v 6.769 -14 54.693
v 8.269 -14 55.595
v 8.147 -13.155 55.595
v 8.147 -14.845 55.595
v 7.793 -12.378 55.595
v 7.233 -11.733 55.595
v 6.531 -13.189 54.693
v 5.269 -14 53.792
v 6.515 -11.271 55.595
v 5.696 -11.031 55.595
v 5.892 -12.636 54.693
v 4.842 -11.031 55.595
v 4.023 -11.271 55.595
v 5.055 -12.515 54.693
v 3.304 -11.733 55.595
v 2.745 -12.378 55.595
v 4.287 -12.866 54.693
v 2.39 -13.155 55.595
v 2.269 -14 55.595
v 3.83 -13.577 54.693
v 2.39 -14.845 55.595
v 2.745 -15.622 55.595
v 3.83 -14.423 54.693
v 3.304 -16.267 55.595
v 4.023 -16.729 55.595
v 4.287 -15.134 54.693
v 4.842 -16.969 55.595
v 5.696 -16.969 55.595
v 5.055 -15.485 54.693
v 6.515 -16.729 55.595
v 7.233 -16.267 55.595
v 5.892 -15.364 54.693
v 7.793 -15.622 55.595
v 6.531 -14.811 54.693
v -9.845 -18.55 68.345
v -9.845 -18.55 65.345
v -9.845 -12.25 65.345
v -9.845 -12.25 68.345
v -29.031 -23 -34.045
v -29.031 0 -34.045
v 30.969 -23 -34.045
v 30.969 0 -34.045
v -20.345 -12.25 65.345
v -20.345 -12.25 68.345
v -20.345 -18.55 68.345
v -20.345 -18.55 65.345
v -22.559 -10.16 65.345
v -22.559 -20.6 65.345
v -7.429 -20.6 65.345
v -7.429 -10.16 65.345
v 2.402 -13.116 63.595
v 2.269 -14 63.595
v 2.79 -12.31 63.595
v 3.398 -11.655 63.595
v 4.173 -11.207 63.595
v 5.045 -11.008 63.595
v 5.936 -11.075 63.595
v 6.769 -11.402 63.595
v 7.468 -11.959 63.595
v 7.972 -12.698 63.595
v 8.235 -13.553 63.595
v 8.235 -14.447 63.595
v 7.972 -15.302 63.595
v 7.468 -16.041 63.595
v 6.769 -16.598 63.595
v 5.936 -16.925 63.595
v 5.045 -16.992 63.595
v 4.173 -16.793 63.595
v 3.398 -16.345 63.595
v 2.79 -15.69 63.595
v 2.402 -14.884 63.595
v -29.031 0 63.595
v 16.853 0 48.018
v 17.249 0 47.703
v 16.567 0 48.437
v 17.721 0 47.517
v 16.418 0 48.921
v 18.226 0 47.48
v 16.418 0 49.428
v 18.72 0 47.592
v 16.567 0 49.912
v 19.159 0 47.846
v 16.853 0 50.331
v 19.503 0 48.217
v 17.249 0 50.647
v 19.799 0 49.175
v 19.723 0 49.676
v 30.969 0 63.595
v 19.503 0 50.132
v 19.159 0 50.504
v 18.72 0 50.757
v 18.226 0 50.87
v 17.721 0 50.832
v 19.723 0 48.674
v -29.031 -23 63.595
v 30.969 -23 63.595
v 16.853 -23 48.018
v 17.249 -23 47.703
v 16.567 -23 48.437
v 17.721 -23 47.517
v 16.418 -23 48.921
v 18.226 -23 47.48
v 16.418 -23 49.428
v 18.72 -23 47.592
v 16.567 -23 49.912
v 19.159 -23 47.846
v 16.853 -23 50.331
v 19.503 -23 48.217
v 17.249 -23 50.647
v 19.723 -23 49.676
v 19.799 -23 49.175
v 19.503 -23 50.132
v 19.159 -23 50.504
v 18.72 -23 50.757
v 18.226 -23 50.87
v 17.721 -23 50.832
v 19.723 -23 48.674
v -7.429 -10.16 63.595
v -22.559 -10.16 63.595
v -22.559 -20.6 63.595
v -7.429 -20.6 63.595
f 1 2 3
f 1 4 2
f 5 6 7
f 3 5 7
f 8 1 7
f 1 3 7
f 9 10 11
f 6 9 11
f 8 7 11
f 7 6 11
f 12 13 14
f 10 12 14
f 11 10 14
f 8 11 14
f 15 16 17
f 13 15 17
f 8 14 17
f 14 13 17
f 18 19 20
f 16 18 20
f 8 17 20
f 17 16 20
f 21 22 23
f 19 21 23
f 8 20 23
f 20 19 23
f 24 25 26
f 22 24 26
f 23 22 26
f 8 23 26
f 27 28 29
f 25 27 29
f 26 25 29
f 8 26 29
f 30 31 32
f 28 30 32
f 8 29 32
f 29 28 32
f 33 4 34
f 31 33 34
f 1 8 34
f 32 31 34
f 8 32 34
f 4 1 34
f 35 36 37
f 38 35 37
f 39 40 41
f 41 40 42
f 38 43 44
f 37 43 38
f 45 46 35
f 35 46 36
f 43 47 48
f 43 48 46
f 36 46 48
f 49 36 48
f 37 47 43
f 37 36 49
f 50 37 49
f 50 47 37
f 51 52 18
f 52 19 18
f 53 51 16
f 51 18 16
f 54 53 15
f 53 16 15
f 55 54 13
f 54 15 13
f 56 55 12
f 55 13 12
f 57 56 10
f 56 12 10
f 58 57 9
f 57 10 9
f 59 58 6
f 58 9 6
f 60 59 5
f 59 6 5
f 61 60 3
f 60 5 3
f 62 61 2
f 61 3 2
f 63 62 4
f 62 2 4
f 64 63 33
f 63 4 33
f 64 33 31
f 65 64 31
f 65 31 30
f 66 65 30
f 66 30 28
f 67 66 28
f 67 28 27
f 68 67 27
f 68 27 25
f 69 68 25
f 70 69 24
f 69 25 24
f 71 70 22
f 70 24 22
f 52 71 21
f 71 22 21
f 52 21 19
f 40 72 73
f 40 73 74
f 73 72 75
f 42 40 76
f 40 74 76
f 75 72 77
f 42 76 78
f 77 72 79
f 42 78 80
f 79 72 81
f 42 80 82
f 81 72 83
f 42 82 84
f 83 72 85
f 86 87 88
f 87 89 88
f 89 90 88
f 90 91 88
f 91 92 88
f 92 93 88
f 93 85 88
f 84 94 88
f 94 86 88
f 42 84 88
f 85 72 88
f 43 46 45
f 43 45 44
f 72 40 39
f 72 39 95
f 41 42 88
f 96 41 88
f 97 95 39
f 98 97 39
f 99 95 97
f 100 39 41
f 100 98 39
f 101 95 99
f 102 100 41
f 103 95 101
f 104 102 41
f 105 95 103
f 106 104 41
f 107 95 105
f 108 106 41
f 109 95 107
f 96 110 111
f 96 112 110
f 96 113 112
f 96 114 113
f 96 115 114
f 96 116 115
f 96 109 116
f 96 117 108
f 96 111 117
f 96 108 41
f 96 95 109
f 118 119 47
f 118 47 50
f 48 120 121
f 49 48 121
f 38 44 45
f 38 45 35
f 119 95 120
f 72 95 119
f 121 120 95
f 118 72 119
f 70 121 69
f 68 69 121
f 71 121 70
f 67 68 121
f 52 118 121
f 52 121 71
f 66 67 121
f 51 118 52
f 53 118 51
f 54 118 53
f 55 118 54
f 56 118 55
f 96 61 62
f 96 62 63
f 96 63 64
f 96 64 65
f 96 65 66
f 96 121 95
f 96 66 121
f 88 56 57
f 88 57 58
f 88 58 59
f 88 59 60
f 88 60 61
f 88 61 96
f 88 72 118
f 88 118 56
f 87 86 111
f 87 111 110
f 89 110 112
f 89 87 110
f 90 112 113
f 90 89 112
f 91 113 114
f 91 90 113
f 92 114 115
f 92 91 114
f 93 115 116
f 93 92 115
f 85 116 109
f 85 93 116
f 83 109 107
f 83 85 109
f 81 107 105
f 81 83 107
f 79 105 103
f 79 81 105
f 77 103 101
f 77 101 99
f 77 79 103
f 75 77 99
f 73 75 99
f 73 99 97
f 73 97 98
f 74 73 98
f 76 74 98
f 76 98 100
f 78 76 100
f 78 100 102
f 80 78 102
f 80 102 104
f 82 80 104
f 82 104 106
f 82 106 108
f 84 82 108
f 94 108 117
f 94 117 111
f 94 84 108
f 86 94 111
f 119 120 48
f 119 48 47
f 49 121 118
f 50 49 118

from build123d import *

# Parameters (mm, degrees)
F0_W     = 60
F0_H     = 97.64
F0_R     = 1.7
F1_DEPTH = 23
F3_D     = 6
F3_DEPTH = 8
F3_TIP   = 1.8025818571
F2_W     = 10.5
F2_H     = 6.3
F4_DEPTH = 4.75
F2_W_2   = 15.13
F2_H_2   = 10.44
F5_DEPTH = 1.75


with BuildPart() as f1:
    # F0 (on Front) → F1 (new body)
    with BuildSketch(Plane.XZ):
        with Locations((0.968804583, 14.7747536898)):
            Rectangle(F0_W, F0_H)
        with Locations((18.098804583, 49.1747536898)):
            Circle(F0_R, mode=Mode.SUBTRACT)
    extrude(amount=F1_DEPTH)

    # F3
    with Locations(Plane.XY.offset(63.5947536898)):
        with Locations((5.268804583, -14)):
            Hole(F3_D / 2, depth=F3_DEPTH)
            with Locations((0, 0, -(F3_DEPTH + F3_TIP / 2))):  # 118° drill point
                Cone(0, F3_D / 2, F3_TIP, mode=Mode.SUBTRACT)

    # F2 (on face) → F4 (join)
    with BuildSketch(Plane.XY.offset(63.5947536898)):
        with Locations((-15.0949036926, -15.4)):
            Rectangle(F2_W, F2_H)
    extrude(amount=F4_DEPTH)

    # F2 (on face) → F5 (join)
    with BuildSketch(Plane.XY.offset(63.5947536898)):
        with Locations((-14.9943149662, -15.38)):
            Rectangle(F2_W_2, F2_H_2)
        with Locations((-15.0949036926, -15.4)):
            Rectangle(F2_W, F2_H, mode=Mode.SUBTRACT)
    extrude(amount=F5_DEPTH)


solid = f1.part
